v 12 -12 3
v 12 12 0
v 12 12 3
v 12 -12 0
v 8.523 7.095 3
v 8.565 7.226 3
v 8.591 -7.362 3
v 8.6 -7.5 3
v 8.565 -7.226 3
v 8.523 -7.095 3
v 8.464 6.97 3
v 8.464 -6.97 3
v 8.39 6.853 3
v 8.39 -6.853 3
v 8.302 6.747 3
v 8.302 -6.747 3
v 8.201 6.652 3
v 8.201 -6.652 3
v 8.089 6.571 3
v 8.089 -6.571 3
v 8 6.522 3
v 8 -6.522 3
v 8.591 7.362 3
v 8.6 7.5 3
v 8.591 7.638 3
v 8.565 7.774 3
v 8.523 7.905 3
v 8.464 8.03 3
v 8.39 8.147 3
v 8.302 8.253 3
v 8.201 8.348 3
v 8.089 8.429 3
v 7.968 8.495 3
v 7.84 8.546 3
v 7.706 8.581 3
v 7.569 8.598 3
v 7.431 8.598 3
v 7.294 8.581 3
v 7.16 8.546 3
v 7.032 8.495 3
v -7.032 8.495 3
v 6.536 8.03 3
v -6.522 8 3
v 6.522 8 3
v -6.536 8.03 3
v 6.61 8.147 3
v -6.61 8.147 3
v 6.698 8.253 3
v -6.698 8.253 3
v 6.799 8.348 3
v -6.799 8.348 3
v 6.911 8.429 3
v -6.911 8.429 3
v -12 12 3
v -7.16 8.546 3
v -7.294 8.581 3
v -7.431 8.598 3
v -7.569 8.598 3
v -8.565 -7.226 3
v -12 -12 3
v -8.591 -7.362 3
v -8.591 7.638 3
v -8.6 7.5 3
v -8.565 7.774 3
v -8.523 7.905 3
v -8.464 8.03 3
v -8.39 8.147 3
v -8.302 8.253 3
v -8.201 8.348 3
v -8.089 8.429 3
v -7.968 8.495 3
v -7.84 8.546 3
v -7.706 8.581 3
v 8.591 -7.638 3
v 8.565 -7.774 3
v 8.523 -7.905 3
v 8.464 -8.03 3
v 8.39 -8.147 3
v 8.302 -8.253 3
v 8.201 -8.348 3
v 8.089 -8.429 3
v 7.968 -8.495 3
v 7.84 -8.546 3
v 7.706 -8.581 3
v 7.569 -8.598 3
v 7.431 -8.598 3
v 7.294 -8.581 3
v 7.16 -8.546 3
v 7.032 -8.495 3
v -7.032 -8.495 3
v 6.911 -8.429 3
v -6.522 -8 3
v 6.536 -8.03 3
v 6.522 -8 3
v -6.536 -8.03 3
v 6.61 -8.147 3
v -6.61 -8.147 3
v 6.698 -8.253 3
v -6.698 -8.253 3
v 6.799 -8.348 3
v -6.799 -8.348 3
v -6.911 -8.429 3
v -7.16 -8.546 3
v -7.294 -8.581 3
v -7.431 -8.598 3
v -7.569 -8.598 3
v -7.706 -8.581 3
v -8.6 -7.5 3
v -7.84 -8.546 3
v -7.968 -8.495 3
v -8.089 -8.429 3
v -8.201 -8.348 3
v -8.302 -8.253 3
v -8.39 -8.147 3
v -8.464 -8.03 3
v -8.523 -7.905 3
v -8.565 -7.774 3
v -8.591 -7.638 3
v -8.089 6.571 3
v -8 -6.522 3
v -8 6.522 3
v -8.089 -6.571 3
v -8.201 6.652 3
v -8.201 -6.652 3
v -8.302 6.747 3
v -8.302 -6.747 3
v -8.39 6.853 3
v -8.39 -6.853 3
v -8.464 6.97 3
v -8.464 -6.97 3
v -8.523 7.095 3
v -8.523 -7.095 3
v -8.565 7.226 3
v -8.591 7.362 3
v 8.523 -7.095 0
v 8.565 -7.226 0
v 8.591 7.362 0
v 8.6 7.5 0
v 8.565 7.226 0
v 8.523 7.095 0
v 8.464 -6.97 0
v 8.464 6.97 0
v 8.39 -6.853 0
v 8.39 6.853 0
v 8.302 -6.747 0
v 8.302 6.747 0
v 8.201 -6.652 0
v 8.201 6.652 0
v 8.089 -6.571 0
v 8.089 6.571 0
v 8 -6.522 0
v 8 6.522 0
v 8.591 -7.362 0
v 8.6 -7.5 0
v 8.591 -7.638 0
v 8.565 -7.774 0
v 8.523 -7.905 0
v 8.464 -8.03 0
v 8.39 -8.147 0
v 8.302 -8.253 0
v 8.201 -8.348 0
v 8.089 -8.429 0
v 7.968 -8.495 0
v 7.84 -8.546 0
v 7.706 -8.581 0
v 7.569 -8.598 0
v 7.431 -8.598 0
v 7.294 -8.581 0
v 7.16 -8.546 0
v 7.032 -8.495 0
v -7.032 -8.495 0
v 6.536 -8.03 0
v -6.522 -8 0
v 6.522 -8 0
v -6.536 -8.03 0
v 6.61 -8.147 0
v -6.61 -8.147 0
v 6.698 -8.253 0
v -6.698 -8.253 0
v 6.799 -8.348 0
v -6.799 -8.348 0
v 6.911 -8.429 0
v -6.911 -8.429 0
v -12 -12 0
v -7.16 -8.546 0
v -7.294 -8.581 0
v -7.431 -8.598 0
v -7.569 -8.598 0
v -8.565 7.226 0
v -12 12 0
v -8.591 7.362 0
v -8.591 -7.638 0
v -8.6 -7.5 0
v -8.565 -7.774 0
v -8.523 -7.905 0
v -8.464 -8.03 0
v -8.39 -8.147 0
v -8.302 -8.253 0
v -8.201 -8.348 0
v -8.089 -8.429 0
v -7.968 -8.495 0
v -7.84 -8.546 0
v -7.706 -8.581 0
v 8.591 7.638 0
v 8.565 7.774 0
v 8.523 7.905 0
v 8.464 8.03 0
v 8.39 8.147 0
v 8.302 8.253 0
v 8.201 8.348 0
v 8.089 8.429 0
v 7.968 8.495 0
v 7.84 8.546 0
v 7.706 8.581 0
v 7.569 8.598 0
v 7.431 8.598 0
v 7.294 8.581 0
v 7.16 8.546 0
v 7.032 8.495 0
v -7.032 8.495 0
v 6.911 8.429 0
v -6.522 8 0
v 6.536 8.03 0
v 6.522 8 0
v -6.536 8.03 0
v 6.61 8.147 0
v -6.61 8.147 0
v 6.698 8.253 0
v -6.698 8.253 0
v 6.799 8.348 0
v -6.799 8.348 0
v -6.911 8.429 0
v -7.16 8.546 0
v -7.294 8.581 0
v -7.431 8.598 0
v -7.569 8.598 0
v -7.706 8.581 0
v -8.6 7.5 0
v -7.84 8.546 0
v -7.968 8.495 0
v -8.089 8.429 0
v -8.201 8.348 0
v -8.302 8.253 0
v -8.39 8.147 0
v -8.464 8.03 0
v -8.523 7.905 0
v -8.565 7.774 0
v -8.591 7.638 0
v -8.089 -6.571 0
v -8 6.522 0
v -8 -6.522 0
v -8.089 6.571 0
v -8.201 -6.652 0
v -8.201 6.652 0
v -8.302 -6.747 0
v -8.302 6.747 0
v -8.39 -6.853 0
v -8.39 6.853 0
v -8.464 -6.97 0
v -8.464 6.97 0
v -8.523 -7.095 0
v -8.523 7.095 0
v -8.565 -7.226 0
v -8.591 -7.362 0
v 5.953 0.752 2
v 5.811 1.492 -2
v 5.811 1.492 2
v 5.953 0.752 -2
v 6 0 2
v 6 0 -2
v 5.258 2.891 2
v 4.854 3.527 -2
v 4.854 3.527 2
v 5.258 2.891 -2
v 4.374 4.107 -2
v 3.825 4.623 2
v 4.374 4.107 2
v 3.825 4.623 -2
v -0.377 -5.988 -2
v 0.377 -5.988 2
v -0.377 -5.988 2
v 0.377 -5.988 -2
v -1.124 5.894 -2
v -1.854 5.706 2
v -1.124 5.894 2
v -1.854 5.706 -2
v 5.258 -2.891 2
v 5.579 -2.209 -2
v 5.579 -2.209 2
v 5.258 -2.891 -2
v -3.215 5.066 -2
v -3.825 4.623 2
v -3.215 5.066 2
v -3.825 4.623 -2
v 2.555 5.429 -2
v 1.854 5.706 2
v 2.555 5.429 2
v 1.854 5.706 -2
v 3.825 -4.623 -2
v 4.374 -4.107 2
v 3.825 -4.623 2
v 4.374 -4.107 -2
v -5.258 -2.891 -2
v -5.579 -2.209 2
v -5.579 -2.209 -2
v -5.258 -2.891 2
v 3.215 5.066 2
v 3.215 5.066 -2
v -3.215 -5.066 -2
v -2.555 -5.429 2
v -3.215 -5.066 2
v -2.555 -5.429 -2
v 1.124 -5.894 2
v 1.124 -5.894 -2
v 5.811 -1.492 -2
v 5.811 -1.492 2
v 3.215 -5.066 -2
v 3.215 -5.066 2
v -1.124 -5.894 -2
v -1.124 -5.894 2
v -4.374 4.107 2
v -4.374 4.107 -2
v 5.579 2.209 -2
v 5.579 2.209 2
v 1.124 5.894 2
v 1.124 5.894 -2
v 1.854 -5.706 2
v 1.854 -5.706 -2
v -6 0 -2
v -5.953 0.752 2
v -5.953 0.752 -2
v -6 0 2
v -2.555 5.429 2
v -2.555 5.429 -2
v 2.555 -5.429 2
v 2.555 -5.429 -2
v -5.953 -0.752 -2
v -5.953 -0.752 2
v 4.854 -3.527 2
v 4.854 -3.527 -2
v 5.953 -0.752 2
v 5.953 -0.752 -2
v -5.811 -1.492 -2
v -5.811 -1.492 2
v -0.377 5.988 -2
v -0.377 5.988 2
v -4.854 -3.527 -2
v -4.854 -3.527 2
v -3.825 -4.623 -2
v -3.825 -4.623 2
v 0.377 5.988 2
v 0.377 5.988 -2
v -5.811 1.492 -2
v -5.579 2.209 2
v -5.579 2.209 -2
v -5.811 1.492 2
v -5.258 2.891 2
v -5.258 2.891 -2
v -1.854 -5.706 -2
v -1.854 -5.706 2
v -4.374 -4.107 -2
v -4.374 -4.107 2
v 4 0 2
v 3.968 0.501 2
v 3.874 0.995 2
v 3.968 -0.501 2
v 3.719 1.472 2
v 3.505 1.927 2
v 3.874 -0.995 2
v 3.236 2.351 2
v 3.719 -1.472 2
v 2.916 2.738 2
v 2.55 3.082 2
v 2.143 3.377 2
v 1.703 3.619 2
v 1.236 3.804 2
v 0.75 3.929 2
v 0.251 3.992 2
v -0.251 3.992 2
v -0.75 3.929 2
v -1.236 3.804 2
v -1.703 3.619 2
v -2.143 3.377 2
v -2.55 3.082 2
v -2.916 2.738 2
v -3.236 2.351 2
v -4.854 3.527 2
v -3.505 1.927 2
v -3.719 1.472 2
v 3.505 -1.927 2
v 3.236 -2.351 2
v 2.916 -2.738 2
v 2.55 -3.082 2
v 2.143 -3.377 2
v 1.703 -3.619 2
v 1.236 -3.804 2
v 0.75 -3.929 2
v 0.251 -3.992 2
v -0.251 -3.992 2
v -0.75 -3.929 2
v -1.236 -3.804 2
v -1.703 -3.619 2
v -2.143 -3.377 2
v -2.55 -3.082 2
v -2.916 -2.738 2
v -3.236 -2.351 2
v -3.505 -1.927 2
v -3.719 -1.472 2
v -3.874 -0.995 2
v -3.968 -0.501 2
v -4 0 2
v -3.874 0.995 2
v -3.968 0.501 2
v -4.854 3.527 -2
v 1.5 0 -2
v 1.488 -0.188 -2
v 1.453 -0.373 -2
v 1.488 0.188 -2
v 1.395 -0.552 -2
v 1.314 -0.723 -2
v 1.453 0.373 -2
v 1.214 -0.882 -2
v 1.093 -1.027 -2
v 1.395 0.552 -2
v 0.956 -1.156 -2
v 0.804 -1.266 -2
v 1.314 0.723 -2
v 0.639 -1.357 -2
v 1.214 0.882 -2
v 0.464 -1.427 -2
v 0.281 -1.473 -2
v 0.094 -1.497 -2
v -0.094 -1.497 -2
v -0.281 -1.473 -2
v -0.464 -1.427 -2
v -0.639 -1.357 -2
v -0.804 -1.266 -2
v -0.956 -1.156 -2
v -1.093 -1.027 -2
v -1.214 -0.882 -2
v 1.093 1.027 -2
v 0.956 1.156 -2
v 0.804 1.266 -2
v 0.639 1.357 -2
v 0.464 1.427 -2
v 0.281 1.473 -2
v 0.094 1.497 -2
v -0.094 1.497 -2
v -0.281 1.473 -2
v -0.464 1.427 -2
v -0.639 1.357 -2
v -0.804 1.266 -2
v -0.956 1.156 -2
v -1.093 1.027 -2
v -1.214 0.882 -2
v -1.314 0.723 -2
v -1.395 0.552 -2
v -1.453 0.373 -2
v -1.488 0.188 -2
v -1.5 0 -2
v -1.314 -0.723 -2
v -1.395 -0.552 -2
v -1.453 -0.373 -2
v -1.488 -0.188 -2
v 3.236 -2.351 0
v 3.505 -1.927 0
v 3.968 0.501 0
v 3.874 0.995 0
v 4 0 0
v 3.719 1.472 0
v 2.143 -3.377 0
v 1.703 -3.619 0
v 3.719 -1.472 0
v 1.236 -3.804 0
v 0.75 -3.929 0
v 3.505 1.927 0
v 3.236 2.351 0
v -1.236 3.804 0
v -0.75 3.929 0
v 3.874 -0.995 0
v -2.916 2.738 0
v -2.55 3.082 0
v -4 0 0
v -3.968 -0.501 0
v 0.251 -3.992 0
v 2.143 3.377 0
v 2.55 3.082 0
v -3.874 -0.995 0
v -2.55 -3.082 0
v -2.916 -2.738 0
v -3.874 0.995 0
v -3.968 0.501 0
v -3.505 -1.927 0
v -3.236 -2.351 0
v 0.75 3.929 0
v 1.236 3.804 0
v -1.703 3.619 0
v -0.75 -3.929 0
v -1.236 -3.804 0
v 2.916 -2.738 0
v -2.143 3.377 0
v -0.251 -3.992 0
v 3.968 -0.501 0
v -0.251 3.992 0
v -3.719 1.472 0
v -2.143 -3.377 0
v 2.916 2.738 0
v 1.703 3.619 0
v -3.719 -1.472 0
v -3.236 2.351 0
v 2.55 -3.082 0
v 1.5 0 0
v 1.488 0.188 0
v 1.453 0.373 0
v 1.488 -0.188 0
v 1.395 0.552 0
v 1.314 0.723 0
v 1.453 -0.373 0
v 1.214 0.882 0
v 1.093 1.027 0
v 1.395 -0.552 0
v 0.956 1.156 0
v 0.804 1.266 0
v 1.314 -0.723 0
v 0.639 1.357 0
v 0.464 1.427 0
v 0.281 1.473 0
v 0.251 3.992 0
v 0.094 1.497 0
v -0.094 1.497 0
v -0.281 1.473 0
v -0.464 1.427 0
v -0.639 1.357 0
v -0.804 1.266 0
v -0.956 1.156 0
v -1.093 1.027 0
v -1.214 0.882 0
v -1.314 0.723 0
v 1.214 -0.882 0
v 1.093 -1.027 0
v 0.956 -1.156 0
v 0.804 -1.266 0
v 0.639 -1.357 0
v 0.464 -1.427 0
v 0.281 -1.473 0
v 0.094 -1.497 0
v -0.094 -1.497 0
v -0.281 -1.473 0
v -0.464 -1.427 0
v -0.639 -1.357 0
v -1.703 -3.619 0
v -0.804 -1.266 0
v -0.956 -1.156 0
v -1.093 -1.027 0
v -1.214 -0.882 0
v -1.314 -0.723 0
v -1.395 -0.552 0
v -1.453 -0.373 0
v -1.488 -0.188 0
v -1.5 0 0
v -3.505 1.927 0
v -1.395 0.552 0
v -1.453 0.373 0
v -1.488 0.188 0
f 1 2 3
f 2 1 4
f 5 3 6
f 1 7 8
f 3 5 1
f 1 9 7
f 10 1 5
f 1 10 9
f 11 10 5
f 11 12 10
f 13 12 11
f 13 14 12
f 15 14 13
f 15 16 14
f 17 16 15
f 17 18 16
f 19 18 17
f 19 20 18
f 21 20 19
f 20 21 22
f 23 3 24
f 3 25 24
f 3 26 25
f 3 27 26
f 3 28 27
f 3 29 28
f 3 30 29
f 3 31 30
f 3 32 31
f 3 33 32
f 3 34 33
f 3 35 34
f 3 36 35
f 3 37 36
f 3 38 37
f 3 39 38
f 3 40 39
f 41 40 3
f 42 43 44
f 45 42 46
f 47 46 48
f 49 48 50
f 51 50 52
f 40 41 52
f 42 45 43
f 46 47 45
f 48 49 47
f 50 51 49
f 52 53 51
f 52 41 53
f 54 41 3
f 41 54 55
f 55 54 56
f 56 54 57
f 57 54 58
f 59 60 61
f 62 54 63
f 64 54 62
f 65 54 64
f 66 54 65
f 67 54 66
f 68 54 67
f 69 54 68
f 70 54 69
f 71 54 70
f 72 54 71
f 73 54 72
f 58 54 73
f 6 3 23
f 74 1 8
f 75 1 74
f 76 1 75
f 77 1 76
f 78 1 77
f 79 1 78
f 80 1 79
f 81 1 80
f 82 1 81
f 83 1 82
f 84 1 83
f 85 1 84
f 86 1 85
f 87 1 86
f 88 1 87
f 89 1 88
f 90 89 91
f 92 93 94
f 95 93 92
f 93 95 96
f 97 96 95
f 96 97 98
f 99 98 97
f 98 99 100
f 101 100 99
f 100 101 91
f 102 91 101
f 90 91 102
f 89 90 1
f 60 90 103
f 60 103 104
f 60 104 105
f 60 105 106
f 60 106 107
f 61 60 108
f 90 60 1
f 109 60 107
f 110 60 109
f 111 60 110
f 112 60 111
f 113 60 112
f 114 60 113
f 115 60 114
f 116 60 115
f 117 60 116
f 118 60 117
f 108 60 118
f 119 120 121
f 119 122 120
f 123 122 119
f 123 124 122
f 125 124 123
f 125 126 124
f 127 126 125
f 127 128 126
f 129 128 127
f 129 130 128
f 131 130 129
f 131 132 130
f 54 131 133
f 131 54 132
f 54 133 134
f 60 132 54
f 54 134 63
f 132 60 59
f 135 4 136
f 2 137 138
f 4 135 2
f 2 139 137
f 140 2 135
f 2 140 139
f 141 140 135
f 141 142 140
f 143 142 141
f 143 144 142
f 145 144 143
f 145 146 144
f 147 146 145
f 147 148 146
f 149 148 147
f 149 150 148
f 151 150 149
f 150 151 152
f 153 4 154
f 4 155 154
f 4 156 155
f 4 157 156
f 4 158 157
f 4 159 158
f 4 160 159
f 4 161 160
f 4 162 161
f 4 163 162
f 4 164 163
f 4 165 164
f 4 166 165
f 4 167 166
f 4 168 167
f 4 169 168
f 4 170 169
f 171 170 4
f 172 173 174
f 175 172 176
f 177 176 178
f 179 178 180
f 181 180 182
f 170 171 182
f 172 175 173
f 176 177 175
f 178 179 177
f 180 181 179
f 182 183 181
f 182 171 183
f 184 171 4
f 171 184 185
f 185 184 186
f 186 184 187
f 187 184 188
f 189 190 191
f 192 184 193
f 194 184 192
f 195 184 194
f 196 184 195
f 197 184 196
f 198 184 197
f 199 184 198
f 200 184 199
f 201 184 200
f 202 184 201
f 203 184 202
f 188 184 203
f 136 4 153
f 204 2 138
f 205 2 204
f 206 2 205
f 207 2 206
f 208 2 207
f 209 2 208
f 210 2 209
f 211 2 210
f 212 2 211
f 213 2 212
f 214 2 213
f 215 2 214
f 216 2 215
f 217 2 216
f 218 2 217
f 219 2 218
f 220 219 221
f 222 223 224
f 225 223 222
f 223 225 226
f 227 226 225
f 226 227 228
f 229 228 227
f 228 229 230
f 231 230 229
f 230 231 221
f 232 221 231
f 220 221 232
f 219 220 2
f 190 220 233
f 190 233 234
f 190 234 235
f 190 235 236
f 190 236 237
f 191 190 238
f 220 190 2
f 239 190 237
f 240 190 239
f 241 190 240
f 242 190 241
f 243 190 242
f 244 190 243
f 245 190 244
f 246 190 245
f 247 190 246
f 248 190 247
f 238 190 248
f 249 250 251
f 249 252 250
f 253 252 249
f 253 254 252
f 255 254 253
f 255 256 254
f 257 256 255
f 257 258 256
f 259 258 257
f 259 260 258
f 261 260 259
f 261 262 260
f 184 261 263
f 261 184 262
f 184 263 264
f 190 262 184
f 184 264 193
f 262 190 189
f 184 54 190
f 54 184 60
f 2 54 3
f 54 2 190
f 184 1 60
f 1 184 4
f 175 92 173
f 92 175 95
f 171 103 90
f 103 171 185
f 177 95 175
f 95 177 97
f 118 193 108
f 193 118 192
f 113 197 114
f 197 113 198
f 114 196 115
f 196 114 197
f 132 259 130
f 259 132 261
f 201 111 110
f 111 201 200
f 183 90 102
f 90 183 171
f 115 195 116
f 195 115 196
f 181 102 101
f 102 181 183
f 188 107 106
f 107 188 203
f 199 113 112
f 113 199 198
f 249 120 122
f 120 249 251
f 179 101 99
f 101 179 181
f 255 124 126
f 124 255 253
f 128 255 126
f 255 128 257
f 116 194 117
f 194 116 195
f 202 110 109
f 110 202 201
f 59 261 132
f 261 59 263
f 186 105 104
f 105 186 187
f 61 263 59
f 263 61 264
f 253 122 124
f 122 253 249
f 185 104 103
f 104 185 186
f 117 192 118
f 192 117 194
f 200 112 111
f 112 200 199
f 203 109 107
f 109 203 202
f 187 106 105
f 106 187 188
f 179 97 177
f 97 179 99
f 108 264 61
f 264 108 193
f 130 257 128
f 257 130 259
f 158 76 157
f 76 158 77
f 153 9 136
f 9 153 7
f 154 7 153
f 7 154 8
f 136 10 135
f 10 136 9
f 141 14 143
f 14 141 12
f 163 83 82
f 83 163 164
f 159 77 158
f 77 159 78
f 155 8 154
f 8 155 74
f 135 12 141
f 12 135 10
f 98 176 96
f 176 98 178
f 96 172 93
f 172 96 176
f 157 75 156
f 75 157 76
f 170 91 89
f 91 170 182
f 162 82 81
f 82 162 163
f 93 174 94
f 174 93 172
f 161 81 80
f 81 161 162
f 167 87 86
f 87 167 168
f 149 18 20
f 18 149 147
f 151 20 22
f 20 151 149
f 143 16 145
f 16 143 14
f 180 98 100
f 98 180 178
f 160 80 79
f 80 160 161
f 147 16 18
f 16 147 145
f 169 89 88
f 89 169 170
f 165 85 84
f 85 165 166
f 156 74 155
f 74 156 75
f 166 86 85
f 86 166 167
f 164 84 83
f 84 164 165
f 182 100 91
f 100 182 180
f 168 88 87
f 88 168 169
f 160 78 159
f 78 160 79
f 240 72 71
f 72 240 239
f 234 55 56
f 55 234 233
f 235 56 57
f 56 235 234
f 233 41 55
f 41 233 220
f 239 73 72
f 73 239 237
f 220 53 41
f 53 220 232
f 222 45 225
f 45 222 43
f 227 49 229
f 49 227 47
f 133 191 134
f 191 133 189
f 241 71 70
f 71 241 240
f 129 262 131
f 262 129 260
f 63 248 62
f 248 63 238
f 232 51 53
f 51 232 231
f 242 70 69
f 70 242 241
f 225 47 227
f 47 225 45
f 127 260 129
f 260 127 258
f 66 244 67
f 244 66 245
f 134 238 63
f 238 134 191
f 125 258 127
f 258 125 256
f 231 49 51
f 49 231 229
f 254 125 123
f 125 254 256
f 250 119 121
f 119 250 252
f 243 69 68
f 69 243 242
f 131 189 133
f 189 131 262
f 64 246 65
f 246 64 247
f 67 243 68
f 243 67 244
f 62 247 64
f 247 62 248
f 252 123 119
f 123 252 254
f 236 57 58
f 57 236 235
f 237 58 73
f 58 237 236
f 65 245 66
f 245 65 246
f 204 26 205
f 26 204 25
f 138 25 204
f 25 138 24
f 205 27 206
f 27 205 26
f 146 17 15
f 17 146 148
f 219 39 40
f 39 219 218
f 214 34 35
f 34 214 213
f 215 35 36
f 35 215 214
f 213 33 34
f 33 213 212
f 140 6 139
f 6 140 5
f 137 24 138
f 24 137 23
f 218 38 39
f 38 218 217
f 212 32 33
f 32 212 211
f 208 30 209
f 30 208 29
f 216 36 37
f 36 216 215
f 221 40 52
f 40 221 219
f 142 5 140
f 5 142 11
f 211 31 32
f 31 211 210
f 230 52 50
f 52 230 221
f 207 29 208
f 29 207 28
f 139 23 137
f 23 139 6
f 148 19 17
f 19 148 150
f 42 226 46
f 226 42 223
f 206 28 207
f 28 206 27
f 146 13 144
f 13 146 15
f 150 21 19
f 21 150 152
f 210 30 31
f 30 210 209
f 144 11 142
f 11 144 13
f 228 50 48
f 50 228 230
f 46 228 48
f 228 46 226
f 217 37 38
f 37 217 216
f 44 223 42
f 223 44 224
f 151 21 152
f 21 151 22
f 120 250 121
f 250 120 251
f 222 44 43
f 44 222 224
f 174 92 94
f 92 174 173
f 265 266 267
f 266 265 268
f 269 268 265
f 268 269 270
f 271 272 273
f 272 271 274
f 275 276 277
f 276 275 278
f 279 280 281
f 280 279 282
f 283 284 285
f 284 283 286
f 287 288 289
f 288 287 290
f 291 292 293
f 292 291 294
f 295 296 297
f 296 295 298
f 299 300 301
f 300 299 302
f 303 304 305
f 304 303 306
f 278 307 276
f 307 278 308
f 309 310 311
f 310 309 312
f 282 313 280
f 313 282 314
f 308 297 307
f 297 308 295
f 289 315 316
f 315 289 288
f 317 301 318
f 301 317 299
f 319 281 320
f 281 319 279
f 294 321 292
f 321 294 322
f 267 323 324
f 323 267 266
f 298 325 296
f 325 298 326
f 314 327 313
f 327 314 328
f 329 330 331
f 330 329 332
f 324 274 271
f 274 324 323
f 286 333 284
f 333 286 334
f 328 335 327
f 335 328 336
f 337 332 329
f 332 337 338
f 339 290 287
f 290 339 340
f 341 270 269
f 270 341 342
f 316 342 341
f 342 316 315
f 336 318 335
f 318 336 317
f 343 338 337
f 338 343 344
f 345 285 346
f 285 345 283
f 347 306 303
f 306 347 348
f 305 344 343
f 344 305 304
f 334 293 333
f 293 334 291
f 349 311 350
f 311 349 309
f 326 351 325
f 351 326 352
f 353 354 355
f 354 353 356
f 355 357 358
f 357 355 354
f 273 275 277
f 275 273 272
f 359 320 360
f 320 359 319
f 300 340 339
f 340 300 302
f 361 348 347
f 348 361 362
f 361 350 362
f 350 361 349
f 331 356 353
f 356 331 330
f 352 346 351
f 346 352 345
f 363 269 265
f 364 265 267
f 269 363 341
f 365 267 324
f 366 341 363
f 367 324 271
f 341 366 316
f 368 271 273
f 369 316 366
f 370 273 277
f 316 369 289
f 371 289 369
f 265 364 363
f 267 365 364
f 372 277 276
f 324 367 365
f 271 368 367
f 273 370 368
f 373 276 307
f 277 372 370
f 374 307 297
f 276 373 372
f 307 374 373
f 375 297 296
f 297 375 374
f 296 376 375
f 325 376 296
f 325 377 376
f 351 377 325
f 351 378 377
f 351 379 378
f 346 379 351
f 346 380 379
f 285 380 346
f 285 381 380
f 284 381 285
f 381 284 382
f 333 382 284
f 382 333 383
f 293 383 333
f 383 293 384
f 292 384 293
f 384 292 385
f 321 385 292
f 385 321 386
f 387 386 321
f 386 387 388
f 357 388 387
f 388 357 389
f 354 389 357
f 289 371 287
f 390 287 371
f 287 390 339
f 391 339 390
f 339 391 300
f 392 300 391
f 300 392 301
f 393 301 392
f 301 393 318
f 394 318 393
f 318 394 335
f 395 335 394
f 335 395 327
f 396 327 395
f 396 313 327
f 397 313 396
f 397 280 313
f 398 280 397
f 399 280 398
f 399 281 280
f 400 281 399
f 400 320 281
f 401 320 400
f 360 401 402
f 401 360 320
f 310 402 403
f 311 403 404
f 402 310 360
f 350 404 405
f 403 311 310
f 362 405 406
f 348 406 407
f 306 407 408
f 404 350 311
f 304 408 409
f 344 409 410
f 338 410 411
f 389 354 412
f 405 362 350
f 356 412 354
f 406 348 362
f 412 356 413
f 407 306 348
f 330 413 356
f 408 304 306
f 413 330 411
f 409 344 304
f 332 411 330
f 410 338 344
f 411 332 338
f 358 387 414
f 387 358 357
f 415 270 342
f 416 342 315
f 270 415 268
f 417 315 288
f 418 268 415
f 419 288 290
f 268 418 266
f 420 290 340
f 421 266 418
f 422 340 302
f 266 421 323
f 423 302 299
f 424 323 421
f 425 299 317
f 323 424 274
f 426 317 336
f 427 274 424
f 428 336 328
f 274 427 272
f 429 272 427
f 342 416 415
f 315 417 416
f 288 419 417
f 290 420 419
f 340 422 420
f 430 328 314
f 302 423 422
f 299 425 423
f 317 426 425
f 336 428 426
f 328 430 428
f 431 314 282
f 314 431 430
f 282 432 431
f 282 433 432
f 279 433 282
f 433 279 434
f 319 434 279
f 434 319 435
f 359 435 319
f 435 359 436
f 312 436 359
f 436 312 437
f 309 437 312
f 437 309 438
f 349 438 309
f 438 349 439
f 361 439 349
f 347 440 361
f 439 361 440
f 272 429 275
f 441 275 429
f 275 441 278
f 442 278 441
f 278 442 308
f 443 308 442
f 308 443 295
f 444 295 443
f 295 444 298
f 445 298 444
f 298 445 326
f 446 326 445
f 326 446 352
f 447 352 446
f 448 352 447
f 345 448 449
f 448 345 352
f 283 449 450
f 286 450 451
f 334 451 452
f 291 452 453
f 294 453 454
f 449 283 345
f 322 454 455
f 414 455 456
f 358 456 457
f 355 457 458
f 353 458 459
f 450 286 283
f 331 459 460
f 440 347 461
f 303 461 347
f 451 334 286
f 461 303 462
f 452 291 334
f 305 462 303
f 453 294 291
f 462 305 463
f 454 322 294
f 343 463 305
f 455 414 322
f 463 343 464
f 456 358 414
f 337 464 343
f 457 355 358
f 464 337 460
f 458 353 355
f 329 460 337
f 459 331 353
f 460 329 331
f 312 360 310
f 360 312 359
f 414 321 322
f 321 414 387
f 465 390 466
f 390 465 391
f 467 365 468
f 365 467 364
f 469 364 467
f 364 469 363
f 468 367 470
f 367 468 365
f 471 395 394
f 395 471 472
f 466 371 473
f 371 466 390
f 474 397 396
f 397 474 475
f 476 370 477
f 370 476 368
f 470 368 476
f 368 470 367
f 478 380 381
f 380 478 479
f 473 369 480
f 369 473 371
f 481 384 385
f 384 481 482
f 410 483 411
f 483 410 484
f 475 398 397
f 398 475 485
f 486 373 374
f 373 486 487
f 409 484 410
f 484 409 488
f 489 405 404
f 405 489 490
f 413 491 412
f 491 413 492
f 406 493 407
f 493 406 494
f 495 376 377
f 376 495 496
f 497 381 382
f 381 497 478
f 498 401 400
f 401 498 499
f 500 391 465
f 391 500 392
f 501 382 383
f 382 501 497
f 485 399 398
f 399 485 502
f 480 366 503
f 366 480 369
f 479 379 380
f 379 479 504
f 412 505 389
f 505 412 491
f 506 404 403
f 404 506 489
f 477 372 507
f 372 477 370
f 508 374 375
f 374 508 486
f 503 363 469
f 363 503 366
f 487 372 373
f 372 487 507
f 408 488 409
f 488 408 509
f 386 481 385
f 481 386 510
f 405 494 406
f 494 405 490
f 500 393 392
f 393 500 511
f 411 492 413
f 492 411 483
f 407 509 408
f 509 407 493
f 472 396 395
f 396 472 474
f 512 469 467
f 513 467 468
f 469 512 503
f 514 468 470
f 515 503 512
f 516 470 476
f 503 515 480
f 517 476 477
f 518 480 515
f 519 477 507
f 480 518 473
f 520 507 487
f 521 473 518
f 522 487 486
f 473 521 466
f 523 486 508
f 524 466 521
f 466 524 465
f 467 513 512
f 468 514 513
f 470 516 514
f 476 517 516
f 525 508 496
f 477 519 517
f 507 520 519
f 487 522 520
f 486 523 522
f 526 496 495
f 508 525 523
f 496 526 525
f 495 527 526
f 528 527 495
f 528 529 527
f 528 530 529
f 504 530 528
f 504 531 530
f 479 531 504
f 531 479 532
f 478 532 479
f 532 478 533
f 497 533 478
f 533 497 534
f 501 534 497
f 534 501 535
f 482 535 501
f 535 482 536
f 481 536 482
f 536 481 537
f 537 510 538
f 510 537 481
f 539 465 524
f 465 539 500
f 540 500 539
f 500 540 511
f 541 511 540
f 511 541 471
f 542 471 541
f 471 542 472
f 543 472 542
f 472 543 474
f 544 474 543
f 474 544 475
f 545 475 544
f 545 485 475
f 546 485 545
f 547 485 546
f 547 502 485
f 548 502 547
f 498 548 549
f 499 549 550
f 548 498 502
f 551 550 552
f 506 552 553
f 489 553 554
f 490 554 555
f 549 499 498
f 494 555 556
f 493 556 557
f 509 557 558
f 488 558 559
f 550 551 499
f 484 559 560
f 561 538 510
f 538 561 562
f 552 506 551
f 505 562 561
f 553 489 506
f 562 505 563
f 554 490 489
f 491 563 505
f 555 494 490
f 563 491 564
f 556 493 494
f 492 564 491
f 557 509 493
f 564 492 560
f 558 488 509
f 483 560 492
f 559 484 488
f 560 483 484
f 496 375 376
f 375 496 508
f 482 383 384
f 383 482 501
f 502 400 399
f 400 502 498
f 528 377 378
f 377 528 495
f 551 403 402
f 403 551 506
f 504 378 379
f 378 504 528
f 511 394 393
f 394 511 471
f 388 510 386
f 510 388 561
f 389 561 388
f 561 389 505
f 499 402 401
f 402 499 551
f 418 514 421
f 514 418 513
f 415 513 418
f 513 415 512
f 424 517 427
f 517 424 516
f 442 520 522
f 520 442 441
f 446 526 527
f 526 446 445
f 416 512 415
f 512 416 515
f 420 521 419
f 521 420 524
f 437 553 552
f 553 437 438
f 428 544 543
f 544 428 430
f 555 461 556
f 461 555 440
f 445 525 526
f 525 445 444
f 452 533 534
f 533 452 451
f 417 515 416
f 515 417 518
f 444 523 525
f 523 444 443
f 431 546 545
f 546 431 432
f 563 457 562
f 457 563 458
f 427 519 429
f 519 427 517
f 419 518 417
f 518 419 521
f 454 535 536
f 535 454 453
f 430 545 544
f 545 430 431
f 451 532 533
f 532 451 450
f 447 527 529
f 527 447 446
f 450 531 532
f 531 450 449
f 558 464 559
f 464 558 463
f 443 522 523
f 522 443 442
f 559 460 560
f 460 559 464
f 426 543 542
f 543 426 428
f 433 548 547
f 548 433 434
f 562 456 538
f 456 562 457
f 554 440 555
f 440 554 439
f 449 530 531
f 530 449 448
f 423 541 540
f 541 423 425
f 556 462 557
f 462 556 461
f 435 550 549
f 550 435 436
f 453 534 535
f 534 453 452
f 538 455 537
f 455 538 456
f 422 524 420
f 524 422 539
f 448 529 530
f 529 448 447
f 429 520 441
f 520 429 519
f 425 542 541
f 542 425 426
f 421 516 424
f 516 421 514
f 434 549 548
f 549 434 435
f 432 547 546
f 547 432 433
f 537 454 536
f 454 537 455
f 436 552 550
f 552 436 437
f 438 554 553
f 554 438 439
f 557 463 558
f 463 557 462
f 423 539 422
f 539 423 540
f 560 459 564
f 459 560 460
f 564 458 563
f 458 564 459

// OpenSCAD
// Soporte de Cámara Térmica AMG8833 para Servo SG90
// USS Taller de Programación I - Solemne 3

$fn = 50; // Resolución de cilindros

// Parámetros Cámara AMG8833
board_w = 20.0;   // Ancho de la placa
board_h = 20.0;   // Alto de la placa
board_t = 1.6;    // Grosor de la placa
hole_dist = 15.0; // Distancia entre centros de agujeros
hole_r = 1.1;     // Radio del agujero del tornillo (M2)

// Parámetros Acople Servo SG90 (Horn circular)
horn_r = 4.0;     // Radio del encastre del servo horn
horn_h = 2.0;     // Profundidad del encastre
shaft_r = 1.5;    // Radio del agujero del eje del servo

module base_placa() {
    difference() {
        // Cuerpo principal
        cube([board_w + 4, board_h + 4, 3], center = true);
        
        // Agujeros de montaje de la placa
        translate([-hole_dist/2, -hole_dist/2, -2])
            cylinder(r = hole_r, h = 6);
        translate([hole_dist/2, -hole_dist/2, -2])
            cylinder(r = hole_r, h = 6);
        translate([-hole_dist/2, hole_dist/2, -2])
            cylinder(r = hole_r, h = 6);
        translate([hole_dist/2, hole_dist/2, -2])
            cylinder(r = hole_r, h = 6);
            
        // Hueco central para soldaduras/componentes traseros de la placa
        cube([board_w - 4, board_h - 4, 4], center = true);
    }
}

module acople_servo() {
    difference() {
        // Cilindro exterior de acople
        cylinder(r = horn_r + 2, h = horn_h + 2);
        // Hueco del horn
        translate([0, 0, 2])
            cylinder(r = horn_r, h = horn_h + 0.1);
        // Agujero para tornillo del eje
        translate([0, 0, -1])
            cylinder(r = shaft_r, h = horn_h + 4);
    }
}

// Ensamblar soporte
union() {
    translate([0, 0, 1.5]) base_placa();
    translate([0, 0, -2.0]) acople_servo();
}
